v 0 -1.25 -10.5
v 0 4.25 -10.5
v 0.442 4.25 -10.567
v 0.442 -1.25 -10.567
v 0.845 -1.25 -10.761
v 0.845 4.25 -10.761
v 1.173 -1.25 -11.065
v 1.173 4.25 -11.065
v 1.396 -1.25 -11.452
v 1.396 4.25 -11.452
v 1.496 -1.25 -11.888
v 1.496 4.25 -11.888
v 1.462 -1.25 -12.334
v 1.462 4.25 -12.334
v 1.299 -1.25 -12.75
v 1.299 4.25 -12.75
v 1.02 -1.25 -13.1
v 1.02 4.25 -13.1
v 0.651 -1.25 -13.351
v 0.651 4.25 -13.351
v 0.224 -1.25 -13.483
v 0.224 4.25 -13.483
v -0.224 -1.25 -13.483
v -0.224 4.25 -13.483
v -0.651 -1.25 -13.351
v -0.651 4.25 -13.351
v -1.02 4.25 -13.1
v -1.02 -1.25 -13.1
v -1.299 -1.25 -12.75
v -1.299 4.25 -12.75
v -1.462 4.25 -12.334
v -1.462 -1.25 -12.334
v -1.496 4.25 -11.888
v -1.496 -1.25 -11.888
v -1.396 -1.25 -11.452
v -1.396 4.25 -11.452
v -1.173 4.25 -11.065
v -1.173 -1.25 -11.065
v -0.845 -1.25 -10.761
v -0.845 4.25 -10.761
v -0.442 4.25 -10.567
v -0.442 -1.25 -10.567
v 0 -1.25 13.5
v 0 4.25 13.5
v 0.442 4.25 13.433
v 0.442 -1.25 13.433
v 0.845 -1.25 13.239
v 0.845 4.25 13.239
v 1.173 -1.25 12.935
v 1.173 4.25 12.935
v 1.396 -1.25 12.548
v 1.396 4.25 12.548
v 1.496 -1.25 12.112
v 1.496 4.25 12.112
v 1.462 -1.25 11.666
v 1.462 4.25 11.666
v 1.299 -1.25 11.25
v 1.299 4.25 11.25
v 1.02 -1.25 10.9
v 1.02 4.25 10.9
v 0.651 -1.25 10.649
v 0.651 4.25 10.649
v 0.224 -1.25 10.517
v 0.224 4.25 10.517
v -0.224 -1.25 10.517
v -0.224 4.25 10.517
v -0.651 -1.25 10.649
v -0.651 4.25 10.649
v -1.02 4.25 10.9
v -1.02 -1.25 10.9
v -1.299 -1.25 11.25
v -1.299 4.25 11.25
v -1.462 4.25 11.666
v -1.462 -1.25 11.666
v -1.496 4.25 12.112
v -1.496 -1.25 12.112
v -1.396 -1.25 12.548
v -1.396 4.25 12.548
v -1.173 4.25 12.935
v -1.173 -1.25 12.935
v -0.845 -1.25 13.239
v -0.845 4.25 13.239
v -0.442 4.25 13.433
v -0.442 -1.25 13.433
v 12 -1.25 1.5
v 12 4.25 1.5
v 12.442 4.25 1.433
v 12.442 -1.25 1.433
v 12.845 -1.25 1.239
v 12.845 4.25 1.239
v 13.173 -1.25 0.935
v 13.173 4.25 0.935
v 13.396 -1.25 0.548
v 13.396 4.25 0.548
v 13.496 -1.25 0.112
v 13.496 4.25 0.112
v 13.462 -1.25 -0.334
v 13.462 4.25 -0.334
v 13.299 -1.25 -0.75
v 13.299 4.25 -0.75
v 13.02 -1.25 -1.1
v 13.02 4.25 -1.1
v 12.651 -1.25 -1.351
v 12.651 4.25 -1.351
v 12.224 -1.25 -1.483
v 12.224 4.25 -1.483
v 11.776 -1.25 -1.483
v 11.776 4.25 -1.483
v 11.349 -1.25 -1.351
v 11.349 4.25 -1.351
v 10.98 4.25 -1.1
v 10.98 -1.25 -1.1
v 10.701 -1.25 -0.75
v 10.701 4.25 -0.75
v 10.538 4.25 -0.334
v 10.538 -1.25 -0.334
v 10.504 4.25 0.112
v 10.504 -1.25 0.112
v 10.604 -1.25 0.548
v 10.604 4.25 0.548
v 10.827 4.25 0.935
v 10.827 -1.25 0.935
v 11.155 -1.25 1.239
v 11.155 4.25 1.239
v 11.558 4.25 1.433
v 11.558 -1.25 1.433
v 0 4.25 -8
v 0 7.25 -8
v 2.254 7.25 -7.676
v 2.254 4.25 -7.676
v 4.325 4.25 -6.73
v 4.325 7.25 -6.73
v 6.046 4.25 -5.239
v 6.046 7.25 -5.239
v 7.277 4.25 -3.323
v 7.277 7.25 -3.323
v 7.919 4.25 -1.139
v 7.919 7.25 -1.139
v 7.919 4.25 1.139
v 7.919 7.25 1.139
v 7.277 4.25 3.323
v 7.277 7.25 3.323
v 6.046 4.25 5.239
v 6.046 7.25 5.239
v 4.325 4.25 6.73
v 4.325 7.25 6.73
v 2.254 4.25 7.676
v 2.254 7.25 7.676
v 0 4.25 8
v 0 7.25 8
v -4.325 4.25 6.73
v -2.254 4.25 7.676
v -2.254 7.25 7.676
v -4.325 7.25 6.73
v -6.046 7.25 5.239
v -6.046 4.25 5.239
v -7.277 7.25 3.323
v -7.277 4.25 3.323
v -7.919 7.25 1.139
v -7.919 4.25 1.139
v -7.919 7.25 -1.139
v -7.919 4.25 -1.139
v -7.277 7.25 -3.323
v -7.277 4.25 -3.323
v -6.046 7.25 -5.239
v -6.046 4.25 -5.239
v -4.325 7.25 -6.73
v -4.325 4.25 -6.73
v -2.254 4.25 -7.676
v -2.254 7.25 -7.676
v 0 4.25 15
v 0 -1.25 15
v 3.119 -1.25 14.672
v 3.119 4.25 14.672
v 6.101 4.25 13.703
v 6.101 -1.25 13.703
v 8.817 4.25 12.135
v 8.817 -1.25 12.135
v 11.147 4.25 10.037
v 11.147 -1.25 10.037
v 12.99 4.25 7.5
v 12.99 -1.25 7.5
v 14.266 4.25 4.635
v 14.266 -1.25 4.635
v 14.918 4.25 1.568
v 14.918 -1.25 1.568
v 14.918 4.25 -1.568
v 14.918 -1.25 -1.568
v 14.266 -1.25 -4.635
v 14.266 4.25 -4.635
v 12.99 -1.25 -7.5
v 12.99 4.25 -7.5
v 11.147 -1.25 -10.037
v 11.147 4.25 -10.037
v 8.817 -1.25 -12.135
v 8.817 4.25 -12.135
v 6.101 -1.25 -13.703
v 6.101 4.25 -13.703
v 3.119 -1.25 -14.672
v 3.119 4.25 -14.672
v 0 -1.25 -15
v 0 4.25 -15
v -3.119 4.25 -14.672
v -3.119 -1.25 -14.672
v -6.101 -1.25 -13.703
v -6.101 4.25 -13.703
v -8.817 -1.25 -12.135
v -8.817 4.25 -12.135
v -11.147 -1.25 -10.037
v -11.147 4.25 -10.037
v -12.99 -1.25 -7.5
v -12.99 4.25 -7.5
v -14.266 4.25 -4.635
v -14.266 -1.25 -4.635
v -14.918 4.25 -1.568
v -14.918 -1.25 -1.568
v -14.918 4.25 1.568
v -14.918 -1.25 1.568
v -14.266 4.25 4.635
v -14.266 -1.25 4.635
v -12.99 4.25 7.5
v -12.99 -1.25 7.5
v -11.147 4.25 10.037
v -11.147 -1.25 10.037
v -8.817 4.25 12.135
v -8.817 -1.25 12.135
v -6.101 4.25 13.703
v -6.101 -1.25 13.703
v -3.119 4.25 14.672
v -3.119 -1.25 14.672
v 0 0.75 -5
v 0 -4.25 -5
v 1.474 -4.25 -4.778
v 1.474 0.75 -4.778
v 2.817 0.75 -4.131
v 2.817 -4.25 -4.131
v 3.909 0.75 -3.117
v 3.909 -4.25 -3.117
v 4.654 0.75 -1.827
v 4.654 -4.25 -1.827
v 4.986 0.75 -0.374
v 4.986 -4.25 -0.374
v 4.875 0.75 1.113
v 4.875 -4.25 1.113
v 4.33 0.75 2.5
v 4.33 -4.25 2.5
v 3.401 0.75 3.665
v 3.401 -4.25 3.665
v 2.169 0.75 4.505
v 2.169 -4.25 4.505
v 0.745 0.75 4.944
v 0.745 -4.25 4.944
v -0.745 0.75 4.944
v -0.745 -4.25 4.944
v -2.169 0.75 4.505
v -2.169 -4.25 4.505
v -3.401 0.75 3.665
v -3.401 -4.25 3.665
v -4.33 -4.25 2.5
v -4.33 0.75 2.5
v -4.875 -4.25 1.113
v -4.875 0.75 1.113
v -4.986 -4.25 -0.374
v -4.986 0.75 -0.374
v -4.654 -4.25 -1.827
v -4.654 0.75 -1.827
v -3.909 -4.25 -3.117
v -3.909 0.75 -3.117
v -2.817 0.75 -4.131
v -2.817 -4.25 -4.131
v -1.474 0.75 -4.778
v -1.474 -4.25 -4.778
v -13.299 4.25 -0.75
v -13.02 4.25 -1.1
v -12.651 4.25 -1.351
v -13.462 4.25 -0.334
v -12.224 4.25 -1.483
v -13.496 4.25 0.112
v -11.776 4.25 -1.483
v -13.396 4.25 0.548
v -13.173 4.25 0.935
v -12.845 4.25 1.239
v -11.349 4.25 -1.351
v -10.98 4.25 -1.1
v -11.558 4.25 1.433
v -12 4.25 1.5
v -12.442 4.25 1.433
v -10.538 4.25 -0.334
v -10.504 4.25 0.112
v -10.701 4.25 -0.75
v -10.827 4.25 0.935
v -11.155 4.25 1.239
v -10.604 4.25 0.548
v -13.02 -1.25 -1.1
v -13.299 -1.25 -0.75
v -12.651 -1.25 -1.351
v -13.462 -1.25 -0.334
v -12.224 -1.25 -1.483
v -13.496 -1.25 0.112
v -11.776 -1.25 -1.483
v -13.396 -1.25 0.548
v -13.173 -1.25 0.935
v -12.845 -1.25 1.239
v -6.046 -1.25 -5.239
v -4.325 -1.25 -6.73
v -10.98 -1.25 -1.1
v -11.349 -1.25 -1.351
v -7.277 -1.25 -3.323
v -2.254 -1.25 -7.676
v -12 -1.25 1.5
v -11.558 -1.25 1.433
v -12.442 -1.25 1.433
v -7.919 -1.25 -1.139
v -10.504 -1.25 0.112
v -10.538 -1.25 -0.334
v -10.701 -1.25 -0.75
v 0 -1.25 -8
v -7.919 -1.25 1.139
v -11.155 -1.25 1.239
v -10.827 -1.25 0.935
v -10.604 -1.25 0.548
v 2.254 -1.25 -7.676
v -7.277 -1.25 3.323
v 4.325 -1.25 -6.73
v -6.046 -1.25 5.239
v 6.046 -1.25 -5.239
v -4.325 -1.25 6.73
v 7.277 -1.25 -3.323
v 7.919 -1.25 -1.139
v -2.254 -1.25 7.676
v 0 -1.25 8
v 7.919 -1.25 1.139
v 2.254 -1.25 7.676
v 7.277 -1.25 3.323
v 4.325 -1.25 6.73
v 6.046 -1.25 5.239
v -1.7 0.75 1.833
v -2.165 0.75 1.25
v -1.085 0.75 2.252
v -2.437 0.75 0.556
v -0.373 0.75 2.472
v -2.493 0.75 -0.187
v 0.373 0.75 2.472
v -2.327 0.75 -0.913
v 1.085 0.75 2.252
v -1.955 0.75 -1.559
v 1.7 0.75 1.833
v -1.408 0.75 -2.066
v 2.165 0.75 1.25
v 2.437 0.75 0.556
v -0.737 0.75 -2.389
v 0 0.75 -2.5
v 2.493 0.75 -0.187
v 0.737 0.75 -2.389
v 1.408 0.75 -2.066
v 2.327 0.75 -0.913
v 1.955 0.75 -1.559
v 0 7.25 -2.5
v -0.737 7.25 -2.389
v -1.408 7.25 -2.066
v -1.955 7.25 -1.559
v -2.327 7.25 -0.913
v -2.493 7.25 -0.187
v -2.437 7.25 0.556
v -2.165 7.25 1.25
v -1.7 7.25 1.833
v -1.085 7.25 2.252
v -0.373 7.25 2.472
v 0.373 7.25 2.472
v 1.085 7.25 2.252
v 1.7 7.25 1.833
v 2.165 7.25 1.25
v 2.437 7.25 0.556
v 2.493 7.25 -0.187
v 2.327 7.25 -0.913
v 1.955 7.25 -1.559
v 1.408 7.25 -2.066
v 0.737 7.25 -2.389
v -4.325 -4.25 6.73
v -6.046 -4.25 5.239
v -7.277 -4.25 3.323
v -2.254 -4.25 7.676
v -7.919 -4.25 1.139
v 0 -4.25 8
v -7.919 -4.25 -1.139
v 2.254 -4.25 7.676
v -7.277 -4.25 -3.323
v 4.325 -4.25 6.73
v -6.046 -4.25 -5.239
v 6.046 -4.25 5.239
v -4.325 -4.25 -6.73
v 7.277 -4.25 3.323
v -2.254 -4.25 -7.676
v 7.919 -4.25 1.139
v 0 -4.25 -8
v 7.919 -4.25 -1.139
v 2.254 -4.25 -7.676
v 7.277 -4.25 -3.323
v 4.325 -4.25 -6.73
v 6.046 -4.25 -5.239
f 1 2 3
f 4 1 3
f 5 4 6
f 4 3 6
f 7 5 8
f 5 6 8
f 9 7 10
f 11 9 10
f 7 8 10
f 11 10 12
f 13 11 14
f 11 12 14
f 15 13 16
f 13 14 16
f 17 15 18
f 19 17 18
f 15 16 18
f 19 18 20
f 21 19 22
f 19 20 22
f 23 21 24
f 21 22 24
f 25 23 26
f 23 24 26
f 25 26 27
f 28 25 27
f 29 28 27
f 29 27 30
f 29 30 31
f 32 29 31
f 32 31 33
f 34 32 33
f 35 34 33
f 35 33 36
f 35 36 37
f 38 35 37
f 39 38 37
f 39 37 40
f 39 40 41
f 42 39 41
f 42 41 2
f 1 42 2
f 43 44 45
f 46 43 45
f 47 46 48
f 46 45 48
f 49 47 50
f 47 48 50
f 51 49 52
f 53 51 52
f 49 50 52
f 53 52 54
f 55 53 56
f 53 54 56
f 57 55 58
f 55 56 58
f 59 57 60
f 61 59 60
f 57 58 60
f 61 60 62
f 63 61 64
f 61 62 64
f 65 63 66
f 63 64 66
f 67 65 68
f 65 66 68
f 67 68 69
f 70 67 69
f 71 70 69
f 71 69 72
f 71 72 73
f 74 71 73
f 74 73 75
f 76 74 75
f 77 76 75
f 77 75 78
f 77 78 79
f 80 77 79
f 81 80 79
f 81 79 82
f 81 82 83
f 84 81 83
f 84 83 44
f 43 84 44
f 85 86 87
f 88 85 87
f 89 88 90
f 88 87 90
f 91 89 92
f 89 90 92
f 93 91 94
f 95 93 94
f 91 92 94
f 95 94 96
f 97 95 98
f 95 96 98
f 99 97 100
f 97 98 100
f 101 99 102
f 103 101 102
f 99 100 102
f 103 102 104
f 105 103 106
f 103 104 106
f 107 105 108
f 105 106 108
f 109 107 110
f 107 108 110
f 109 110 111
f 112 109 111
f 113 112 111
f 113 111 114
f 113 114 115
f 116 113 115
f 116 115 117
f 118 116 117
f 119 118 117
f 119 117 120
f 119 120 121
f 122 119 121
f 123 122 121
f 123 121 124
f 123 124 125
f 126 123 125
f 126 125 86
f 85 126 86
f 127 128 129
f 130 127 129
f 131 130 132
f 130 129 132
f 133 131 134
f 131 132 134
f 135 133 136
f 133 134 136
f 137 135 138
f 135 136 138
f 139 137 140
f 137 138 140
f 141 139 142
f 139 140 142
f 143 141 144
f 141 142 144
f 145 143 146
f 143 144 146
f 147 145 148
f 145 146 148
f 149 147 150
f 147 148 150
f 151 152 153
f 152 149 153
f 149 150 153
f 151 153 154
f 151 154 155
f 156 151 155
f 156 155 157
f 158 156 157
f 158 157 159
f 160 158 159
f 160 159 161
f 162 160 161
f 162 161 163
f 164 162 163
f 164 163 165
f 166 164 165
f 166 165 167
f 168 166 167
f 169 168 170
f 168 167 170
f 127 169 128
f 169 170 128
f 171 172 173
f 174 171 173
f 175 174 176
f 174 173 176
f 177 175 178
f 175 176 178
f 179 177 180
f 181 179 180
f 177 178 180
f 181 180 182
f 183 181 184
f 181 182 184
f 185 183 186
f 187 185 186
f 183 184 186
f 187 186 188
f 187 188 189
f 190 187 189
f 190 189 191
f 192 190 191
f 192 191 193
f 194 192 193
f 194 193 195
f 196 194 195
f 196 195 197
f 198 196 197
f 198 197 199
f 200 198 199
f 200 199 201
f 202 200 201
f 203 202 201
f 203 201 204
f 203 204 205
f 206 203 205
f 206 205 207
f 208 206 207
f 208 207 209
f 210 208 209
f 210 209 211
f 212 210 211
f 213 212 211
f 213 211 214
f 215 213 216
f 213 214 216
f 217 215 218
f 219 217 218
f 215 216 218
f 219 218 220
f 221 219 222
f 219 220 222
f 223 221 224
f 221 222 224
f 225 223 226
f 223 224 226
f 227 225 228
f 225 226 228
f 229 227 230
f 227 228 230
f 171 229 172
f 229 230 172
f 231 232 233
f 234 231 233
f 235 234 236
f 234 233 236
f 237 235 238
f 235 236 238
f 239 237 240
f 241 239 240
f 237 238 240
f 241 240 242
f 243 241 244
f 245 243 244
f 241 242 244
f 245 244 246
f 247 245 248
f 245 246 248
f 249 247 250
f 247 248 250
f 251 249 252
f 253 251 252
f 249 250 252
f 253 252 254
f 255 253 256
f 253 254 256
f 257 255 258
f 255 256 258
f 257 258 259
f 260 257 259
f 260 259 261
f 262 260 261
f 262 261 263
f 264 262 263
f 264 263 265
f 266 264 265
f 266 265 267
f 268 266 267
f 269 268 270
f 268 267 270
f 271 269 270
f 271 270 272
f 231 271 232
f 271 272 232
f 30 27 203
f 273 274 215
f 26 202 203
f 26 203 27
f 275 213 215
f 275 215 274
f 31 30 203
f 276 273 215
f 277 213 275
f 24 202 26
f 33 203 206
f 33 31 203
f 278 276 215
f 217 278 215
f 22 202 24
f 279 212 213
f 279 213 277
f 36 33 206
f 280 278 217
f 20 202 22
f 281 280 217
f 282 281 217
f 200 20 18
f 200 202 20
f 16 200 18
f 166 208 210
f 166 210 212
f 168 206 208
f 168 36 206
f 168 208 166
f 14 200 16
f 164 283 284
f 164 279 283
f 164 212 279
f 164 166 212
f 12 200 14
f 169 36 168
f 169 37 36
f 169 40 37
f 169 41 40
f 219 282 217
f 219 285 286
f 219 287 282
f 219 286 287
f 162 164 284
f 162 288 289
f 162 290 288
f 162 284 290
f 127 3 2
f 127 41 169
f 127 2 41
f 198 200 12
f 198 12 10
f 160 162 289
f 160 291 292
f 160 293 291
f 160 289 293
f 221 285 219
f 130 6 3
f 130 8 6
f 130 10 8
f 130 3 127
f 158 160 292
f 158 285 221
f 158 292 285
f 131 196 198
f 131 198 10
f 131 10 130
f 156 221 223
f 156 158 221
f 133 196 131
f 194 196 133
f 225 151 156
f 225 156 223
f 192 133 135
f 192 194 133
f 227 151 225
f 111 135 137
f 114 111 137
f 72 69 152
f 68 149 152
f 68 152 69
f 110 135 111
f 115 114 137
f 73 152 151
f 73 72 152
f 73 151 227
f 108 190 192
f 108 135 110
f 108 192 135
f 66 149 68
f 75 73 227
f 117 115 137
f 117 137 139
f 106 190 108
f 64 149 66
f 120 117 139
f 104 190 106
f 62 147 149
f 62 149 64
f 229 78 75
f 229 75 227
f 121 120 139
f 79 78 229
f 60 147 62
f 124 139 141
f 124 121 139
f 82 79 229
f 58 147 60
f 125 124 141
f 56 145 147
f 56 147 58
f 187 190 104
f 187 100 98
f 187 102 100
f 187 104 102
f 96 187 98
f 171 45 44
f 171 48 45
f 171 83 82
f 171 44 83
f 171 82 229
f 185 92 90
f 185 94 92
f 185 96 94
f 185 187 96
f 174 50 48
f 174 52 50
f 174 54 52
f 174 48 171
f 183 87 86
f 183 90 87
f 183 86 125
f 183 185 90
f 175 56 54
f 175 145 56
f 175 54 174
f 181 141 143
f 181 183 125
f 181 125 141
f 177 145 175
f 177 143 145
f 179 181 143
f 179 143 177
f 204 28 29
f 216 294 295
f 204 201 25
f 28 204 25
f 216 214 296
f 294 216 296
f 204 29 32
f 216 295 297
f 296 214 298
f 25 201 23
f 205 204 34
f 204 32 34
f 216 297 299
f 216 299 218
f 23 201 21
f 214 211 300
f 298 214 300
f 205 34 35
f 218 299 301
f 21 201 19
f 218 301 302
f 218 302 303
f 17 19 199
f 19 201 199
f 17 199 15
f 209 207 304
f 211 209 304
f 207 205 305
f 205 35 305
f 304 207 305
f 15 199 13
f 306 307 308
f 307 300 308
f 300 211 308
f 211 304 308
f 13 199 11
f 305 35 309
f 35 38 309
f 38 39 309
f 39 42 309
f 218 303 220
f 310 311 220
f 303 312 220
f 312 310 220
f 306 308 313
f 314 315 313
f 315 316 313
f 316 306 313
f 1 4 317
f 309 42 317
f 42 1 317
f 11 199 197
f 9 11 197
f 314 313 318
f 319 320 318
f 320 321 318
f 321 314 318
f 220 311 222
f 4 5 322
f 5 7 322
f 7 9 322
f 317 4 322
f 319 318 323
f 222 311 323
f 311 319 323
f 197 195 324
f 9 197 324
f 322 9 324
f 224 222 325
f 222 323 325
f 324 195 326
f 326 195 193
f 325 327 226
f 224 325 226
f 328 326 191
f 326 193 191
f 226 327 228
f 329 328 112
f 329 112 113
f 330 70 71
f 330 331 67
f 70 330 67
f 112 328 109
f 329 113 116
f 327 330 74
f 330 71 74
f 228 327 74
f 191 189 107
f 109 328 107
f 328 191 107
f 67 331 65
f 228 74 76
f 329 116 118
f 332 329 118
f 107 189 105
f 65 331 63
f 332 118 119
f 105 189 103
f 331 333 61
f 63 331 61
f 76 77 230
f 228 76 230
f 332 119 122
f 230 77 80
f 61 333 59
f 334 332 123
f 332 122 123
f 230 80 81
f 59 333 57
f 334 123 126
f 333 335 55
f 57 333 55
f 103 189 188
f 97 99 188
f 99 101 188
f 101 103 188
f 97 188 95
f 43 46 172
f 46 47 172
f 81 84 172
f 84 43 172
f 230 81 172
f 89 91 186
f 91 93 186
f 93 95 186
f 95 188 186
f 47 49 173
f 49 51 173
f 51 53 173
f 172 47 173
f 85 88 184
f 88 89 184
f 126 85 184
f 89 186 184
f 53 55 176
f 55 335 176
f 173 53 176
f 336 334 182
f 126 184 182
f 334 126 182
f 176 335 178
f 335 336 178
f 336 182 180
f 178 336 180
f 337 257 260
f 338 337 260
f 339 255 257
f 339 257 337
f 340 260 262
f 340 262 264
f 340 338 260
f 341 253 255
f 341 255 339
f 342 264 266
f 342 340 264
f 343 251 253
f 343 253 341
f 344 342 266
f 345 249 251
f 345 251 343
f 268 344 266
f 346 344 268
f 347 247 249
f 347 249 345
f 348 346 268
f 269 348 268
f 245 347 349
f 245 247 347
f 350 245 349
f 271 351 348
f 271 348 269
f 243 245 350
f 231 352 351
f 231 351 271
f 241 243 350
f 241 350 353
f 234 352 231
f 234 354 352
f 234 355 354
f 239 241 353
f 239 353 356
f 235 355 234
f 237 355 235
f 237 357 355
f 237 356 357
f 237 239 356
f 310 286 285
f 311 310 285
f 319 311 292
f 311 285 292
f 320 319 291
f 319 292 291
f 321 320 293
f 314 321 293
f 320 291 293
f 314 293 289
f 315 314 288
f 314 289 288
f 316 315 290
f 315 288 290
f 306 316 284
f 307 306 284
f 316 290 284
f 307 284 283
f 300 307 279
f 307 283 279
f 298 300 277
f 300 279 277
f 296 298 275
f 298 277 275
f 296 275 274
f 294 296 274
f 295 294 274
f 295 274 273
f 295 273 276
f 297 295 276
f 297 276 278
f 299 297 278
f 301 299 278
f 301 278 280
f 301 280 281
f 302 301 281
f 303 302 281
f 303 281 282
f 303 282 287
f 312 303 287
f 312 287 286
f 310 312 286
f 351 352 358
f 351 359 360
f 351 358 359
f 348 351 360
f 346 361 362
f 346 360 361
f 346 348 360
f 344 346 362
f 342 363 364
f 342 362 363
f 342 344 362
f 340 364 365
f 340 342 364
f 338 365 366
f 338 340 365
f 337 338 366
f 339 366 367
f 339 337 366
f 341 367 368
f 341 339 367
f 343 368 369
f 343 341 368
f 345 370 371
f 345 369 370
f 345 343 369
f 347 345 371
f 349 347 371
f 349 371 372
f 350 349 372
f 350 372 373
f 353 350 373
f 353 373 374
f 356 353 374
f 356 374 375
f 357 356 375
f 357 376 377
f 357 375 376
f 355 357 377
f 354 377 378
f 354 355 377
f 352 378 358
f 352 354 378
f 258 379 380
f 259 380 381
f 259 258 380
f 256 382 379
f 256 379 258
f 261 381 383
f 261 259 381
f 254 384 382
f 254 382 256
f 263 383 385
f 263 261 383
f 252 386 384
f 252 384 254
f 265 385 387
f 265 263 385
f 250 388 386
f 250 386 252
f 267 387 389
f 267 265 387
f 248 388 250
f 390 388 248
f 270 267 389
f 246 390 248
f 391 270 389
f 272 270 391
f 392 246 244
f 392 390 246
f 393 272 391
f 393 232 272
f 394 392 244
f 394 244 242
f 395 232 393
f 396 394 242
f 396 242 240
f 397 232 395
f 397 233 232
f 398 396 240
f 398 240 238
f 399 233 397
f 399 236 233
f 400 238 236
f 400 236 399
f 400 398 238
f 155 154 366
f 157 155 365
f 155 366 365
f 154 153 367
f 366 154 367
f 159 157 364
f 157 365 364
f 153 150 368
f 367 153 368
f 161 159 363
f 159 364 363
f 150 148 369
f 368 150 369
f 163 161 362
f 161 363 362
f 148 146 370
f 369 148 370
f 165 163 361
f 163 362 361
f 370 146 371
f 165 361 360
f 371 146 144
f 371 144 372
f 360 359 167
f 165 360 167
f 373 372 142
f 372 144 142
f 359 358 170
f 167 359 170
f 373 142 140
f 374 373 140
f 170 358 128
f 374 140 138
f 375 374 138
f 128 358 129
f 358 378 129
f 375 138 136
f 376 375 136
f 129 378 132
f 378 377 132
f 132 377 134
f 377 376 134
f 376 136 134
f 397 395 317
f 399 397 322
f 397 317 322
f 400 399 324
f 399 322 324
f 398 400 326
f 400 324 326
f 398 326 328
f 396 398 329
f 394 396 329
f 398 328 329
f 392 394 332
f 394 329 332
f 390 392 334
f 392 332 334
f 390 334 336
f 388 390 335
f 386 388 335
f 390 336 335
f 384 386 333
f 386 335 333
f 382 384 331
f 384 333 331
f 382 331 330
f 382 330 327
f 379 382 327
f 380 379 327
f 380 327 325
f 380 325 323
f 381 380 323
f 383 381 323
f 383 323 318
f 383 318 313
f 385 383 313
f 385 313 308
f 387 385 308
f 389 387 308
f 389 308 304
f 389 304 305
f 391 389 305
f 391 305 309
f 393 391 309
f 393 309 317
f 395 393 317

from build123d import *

# Parameters (mm, degrees)
SKETCH_1_R               = 15
SKETCH_1_R_2             = 2
SKETCH_1_R_3             = 1.5
EXTRUDE_1_DEPTH          = 3
EXTRUDE_2_DEPTH          = 4.25
EXTRUDE_2_DEPTH_BACK     = 7.25
SKETCH_2_R               = 8
EXTRUDE_3_DEPTH          = 1.25
EXTRUDE_3_DEPTH_BACK     = 4.25
SKETCH_5_R               = 15
CUT_EXTRUDE_1_DEPTH      = 5
CUT_EXTRUDE_1_DEPTH_BACK = 16.5
SKETCH_3_R               = 2.5
SKETCH_7_R               = 1.5
CUT_EXTRUDE_4_DEPTH      = 14
SKETCH_9_R               = 5
CUT_EXTRUDE_6_DEPTH      = 5


with BuildPart() as part:
    # 草图1 → 凸台-拉伸1 (new body)
    with BuildSketch(Plane(origin=(0, 0, 0), x_dir=(1, 0, 0), z_dir=(0, 1, 0))):
        with Locations(Location((0, 0, 0), (0, 0, 270))):
            Circle(SKETCH_1_R)
        with Locations(Location((0, 0, 0), (0, 0, 270))):
            Circle(SKETCH_1_R_2, mode=Mode.SUBTRACT)
        with Locations(Location((0, 6, 0), (0, 0, 270))):
            Circle(SKETCH_1_R_3, mode=Mode.SUBTRACT)
        with Locations(Location((6, 0, 0), (0, 0, 270))):
            Circle(SKETCH_1_R_3, mode=Mode.SUBTRACT)
        with Locations(Location((0, -6, 0), (0, 0, 270))):
            Circle(SKETCH_1_R_3, mode=Mode.SUBTRACT)
        with Locations(Location((-6, 0, 0), (0, 0, 270))):
            Circle(SKETCH_1_R_3, mode=Mode.SUBTRACT)
        with Locations(Location((0, 12, 0), (0, 0, 270))):
            Circle(SKETCH_1_R_3, mode=Mode.SUBTRACT)
        with Locations(Location((12, 0, 0), (0, 0, 270))):
            Circle(SKETCH_1_R_3, mode=Mode.SUBTRACT)
        with Locations(Location((0, -12, 0), (0, 0, 270))):
            Circle(SKETCH_1_R_3, mode=Mode.SUBTRACT)
        with Locations(Location((-12, 0, 0), (0, 0, 270))):
            Circle(SKETCH_1_R_3, mode=Mode.SUBTRACT)
    extrude(amount=EXTRUDE_1_DEPTH)

    # 草图2 → 凸台-拉伸2 (add, two sides: drawn at the far end of the back side and taken through both)
    with BuildSketch(Plane.XZ.offset(-EXTRUDE_2_DEPTH_BACK)):
        with Locations(Location((0, 0, 0), (0, 0, 270))):
            Circle(SKETCH_2_R)
    extrude(amount=EXTRUDE_2_DEPTH + EXTRUDE_2_DEPTH_BACK)

    # 草图5 → 凸台-拉伸3 (add, two sides: drawn at the far end of the back side and taken through both)
    with BuildSketch(Plane(origin=(0, 3, 0), x_dir=(1, 0, 0), z_dir=(0, 1, 0)).offset(-EXTRUDE_3_DEPTH_BACK)):
        with Locations(Location((0, 0, 0), (0, 0, 270))):
            Circle(SKETCH_5_R)
    extrude(amount=EXTRUDE_3_DEPTH + EXTRUDE_3_DEPTH_BACK)

    # 草图3 → 切除-拉伸1 (cut, two sides: drawn at the far end of the back side and taken through both)
    with BuildSketch(Plane(origin=(0, 3, 0), x_dir=(1, 0, 0), z_dir=(0, 1, 0)).offset(-CUT_EXTRUDE_1_DEPTH_BACK)):
        with Locations(Location((0, 0, 0), (0, 0, 90))):
            Circle(SKETCH_3_R)
    extrude(amount=CUT_EXTRUDE_1_DEPTH + CUT_EXTRUDE_1_DEPTH_BACK, mode=Mode.SUBTRACT)

    # 草图7 → 切除-拉伸4 (cut)
    with BuildSketch(Plane(origin=(0, 7.25, 0), x_dir=(1, 0, 0), z_dir=(0, 1, 0))):
        with Locations(Location((0, 12, 0), (0, 0, 270))):
            Circle(SKETCH_7_R)
        with Locations(Location((-12, 0, 0), (0, 0, 270))):
            Circle(SKETCH_7_R)
        with Locations(Location((12, 0, 0), (0, 0, 270))):
            Circle(SKETCH_7_R)
        with Locations(Location((0, -12, 0), (0, 0, 270))):
            Circle(SKETCH_7_R)
    extrude(amount=-CUT_EXTRUDE_4_DEPTH, mode=Mode.SUBTRACT)

    # 草图9 → 切除-拉伸6 (cut)
    with BuildSketch(Plane.XZ.offset(4.25)):
        with Locations(Location((0, 0, 0), (0, 0, 270))):
            Circle(SKETCH_9_R)
    extrude(amount=-CUT_EXTRUDE_6_DEPTH, mode=Mode.SUBTRACT)


solid = part.part
